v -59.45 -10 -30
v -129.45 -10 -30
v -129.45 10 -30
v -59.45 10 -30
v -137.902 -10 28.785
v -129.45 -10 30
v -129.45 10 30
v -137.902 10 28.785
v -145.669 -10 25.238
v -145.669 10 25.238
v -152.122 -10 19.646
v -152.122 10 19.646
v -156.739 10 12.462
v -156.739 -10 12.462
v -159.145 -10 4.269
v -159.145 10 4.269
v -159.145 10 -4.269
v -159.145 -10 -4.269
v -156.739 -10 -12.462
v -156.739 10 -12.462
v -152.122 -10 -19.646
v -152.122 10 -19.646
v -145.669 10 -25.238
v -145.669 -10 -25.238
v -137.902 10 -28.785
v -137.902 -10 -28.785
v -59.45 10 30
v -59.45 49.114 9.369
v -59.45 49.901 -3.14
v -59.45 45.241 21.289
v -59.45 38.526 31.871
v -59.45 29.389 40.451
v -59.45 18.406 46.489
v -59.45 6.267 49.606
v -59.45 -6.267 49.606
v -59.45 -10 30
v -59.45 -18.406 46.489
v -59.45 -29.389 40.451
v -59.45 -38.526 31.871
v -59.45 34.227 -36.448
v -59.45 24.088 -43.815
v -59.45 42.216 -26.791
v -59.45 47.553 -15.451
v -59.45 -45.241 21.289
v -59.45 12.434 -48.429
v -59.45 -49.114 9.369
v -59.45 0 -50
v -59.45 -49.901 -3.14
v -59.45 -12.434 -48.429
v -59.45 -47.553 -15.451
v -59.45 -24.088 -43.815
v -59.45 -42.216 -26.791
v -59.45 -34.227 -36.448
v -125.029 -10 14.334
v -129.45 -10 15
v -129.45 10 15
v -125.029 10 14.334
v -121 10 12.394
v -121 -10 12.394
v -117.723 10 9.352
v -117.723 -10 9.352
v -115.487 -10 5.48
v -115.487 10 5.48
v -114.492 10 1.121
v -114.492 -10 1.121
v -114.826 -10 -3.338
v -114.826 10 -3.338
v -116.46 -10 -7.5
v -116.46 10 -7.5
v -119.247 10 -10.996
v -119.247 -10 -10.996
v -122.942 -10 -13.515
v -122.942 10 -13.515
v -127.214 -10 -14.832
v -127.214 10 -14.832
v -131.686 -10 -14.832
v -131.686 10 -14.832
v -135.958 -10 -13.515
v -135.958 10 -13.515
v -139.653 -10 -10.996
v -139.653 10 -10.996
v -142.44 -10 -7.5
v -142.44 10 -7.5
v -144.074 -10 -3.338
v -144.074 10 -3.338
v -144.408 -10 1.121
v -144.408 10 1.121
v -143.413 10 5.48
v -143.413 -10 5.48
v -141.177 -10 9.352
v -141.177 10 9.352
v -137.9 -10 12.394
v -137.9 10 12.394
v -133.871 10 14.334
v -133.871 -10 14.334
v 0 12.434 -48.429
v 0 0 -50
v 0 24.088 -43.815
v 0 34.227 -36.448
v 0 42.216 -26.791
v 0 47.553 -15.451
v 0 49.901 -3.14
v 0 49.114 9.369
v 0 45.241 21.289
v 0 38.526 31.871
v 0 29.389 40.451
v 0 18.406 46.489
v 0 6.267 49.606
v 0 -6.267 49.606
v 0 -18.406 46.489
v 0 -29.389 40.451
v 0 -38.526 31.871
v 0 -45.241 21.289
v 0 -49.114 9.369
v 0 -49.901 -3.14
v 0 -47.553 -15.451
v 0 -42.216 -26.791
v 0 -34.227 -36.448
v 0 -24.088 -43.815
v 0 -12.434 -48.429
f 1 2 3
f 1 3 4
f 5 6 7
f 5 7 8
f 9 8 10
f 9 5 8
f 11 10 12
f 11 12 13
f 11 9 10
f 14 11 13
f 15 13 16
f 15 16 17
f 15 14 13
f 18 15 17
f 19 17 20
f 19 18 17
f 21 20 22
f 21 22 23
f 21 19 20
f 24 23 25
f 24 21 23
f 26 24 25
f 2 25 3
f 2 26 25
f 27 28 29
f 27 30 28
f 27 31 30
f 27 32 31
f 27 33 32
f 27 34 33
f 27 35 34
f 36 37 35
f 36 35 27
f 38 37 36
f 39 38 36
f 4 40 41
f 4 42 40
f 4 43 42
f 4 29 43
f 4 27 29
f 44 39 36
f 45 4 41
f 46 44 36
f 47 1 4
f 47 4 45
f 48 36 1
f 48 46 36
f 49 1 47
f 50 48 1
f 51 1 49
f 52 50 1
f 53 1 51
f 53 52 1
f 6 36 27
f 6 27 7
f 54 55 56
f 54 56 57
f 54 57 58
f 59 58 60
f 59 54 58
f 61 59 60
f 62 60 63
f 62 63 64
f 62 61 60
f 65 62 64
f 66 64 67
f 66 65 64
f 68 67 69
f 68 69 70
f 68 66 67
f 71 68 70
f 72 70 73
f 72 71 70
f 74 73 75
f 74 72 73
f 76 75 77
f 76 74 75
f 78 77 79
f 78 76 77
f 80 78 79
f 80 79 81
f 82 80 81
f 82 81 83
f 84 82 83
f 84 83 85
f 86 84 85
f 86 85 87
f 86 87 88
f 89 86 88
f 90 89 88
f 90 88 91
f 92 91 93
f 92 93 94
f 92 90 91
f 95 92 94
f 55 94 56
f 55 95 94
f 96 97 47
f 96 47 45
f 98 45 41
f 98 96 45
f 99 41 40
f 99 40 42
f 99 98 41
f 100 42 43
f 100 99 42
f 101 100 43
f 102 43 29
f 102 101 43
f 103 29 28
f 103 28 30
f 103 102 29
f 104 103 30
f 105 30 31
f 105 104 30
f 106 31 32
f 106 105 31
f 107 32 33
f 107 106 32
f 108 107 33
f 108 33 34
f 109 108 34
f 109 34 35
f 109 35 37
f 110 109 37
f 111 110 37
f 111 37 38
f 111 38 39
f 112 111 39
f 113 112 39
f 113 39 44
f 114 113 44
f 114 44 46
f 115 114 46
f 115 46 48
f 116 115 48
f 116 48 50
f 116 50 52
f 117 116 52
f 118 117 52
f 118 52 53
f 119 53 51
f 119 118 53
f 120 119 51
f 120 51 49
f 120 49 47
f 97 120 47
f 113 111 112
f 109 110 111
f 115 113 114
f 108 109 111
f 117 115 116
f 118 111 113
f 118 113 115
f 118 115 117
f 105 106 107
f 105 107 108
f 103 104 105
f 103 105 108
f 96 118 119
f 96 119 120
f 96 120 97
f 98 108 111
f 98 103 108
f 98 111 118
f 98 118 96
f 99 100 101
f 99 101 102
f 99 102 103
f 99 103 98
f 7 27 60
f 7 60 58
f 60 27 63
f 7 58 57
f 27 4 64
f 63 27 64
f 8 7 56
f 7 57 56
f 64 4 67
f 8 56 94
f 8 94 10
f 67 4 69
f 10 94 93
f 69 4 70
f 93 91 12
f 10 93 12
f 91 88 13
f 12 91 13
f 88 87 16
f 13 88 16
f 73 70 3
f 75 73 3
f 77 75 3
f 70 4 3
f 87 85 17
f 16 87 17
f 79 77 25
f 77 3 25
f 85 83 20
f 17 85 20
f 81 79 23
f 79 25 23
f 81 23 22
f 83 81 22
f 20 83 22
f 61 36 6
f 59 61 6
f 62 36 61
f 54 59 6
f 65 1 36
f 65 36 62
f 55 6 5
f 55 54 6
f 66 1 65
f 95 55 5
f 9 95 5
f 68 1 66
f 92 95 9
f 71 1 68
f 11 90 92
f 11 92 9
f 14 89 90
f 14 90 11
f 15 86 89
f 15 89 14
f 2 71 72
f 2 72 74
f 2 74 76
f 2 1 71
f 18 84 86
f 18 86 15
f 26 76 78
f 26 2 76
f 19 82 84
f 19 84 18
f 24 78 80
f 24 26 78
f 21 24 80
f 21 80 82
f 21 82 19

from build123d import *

# Parameters (mm, degrees)
SKETCH1_R                = 50
BOSS_EXTRUDE1_DEPTH      = 129.45
CUT_EXTRUDE1_DEPTH       = 129.45
CUT_EXTRUDE1_DEPTH_BACK  = 129.45
SKETCH3_W                = 73.302623589
SKETCH3_H                = 112.659736925
BOSS_EXTRUDE2_DEPTH      = 10
BOSS_EXTRUDE2_DEPTH_BACK = 10
SKETCH2_R                = 15


with BuildPart() as part:
    # Sketch1 → Boss-Extrude1 (new body)
    with BuildSketch(Plane(origin=(0, 0, 0), x_dir=(0, 0, -1), z_dir=(1, 0, 0))):
        Circle(SKETCH1_R)
    extrude(amount=-BOSS_EXTRUDE1_DEPTH)

    # Sketch3 → Cut-Extrude1 (cut, two sides: drawn at the far end of the back side and taken through both)
    with BuildSketch(Plane(origin=(0, 0, 0), x_dir=(1, 0, 0), z_dir=(0, 1, 0)).offset(-CUT_EXTRUDE1_DEPTH_BACK)):
        with Locations((-96.101311794, -3.115771473)):
            Rectangle(SKETCH3_W, SKETCH3_H)
    extrude(amount=CUT_EXTRUDE1_DEPTH + CUT_EXTRUDE1_DEPTH_BACK, mode=Mode.SUBTRACT)

    # Sketch2 → Boss-Extrude2 (add, two sides: drawn at the far end of the back side and taken through both)
    with BuildSketch(Plane(origin=(0, 0, 0), x_dir=(1, 0, 0), z_dir=(0, 1, 0)).offset(-BOSS_EXTRUDE2_DEPTH_BACK)):
        with BuildLine():
            Line((-129.45, 30), (-59.45, 30))
            Line((-59.45, 30), (-59.45, -30))
            Line((-59.45, -30), (-129.45, -30))
            ThreePointArc((-129.45, -30), (-159.45, 0), (-129.45, 30))
        make_face()
        with Locations((-129.45, 0)):
            Circle(SKETCH2_R, mode=Mode.SUBTRACT)
    extrude(amount=BOSS_EXTRUDE2_DEPTH + BOSS_EXTRUDE2_DEPTH_BACK)


solid = part.part
